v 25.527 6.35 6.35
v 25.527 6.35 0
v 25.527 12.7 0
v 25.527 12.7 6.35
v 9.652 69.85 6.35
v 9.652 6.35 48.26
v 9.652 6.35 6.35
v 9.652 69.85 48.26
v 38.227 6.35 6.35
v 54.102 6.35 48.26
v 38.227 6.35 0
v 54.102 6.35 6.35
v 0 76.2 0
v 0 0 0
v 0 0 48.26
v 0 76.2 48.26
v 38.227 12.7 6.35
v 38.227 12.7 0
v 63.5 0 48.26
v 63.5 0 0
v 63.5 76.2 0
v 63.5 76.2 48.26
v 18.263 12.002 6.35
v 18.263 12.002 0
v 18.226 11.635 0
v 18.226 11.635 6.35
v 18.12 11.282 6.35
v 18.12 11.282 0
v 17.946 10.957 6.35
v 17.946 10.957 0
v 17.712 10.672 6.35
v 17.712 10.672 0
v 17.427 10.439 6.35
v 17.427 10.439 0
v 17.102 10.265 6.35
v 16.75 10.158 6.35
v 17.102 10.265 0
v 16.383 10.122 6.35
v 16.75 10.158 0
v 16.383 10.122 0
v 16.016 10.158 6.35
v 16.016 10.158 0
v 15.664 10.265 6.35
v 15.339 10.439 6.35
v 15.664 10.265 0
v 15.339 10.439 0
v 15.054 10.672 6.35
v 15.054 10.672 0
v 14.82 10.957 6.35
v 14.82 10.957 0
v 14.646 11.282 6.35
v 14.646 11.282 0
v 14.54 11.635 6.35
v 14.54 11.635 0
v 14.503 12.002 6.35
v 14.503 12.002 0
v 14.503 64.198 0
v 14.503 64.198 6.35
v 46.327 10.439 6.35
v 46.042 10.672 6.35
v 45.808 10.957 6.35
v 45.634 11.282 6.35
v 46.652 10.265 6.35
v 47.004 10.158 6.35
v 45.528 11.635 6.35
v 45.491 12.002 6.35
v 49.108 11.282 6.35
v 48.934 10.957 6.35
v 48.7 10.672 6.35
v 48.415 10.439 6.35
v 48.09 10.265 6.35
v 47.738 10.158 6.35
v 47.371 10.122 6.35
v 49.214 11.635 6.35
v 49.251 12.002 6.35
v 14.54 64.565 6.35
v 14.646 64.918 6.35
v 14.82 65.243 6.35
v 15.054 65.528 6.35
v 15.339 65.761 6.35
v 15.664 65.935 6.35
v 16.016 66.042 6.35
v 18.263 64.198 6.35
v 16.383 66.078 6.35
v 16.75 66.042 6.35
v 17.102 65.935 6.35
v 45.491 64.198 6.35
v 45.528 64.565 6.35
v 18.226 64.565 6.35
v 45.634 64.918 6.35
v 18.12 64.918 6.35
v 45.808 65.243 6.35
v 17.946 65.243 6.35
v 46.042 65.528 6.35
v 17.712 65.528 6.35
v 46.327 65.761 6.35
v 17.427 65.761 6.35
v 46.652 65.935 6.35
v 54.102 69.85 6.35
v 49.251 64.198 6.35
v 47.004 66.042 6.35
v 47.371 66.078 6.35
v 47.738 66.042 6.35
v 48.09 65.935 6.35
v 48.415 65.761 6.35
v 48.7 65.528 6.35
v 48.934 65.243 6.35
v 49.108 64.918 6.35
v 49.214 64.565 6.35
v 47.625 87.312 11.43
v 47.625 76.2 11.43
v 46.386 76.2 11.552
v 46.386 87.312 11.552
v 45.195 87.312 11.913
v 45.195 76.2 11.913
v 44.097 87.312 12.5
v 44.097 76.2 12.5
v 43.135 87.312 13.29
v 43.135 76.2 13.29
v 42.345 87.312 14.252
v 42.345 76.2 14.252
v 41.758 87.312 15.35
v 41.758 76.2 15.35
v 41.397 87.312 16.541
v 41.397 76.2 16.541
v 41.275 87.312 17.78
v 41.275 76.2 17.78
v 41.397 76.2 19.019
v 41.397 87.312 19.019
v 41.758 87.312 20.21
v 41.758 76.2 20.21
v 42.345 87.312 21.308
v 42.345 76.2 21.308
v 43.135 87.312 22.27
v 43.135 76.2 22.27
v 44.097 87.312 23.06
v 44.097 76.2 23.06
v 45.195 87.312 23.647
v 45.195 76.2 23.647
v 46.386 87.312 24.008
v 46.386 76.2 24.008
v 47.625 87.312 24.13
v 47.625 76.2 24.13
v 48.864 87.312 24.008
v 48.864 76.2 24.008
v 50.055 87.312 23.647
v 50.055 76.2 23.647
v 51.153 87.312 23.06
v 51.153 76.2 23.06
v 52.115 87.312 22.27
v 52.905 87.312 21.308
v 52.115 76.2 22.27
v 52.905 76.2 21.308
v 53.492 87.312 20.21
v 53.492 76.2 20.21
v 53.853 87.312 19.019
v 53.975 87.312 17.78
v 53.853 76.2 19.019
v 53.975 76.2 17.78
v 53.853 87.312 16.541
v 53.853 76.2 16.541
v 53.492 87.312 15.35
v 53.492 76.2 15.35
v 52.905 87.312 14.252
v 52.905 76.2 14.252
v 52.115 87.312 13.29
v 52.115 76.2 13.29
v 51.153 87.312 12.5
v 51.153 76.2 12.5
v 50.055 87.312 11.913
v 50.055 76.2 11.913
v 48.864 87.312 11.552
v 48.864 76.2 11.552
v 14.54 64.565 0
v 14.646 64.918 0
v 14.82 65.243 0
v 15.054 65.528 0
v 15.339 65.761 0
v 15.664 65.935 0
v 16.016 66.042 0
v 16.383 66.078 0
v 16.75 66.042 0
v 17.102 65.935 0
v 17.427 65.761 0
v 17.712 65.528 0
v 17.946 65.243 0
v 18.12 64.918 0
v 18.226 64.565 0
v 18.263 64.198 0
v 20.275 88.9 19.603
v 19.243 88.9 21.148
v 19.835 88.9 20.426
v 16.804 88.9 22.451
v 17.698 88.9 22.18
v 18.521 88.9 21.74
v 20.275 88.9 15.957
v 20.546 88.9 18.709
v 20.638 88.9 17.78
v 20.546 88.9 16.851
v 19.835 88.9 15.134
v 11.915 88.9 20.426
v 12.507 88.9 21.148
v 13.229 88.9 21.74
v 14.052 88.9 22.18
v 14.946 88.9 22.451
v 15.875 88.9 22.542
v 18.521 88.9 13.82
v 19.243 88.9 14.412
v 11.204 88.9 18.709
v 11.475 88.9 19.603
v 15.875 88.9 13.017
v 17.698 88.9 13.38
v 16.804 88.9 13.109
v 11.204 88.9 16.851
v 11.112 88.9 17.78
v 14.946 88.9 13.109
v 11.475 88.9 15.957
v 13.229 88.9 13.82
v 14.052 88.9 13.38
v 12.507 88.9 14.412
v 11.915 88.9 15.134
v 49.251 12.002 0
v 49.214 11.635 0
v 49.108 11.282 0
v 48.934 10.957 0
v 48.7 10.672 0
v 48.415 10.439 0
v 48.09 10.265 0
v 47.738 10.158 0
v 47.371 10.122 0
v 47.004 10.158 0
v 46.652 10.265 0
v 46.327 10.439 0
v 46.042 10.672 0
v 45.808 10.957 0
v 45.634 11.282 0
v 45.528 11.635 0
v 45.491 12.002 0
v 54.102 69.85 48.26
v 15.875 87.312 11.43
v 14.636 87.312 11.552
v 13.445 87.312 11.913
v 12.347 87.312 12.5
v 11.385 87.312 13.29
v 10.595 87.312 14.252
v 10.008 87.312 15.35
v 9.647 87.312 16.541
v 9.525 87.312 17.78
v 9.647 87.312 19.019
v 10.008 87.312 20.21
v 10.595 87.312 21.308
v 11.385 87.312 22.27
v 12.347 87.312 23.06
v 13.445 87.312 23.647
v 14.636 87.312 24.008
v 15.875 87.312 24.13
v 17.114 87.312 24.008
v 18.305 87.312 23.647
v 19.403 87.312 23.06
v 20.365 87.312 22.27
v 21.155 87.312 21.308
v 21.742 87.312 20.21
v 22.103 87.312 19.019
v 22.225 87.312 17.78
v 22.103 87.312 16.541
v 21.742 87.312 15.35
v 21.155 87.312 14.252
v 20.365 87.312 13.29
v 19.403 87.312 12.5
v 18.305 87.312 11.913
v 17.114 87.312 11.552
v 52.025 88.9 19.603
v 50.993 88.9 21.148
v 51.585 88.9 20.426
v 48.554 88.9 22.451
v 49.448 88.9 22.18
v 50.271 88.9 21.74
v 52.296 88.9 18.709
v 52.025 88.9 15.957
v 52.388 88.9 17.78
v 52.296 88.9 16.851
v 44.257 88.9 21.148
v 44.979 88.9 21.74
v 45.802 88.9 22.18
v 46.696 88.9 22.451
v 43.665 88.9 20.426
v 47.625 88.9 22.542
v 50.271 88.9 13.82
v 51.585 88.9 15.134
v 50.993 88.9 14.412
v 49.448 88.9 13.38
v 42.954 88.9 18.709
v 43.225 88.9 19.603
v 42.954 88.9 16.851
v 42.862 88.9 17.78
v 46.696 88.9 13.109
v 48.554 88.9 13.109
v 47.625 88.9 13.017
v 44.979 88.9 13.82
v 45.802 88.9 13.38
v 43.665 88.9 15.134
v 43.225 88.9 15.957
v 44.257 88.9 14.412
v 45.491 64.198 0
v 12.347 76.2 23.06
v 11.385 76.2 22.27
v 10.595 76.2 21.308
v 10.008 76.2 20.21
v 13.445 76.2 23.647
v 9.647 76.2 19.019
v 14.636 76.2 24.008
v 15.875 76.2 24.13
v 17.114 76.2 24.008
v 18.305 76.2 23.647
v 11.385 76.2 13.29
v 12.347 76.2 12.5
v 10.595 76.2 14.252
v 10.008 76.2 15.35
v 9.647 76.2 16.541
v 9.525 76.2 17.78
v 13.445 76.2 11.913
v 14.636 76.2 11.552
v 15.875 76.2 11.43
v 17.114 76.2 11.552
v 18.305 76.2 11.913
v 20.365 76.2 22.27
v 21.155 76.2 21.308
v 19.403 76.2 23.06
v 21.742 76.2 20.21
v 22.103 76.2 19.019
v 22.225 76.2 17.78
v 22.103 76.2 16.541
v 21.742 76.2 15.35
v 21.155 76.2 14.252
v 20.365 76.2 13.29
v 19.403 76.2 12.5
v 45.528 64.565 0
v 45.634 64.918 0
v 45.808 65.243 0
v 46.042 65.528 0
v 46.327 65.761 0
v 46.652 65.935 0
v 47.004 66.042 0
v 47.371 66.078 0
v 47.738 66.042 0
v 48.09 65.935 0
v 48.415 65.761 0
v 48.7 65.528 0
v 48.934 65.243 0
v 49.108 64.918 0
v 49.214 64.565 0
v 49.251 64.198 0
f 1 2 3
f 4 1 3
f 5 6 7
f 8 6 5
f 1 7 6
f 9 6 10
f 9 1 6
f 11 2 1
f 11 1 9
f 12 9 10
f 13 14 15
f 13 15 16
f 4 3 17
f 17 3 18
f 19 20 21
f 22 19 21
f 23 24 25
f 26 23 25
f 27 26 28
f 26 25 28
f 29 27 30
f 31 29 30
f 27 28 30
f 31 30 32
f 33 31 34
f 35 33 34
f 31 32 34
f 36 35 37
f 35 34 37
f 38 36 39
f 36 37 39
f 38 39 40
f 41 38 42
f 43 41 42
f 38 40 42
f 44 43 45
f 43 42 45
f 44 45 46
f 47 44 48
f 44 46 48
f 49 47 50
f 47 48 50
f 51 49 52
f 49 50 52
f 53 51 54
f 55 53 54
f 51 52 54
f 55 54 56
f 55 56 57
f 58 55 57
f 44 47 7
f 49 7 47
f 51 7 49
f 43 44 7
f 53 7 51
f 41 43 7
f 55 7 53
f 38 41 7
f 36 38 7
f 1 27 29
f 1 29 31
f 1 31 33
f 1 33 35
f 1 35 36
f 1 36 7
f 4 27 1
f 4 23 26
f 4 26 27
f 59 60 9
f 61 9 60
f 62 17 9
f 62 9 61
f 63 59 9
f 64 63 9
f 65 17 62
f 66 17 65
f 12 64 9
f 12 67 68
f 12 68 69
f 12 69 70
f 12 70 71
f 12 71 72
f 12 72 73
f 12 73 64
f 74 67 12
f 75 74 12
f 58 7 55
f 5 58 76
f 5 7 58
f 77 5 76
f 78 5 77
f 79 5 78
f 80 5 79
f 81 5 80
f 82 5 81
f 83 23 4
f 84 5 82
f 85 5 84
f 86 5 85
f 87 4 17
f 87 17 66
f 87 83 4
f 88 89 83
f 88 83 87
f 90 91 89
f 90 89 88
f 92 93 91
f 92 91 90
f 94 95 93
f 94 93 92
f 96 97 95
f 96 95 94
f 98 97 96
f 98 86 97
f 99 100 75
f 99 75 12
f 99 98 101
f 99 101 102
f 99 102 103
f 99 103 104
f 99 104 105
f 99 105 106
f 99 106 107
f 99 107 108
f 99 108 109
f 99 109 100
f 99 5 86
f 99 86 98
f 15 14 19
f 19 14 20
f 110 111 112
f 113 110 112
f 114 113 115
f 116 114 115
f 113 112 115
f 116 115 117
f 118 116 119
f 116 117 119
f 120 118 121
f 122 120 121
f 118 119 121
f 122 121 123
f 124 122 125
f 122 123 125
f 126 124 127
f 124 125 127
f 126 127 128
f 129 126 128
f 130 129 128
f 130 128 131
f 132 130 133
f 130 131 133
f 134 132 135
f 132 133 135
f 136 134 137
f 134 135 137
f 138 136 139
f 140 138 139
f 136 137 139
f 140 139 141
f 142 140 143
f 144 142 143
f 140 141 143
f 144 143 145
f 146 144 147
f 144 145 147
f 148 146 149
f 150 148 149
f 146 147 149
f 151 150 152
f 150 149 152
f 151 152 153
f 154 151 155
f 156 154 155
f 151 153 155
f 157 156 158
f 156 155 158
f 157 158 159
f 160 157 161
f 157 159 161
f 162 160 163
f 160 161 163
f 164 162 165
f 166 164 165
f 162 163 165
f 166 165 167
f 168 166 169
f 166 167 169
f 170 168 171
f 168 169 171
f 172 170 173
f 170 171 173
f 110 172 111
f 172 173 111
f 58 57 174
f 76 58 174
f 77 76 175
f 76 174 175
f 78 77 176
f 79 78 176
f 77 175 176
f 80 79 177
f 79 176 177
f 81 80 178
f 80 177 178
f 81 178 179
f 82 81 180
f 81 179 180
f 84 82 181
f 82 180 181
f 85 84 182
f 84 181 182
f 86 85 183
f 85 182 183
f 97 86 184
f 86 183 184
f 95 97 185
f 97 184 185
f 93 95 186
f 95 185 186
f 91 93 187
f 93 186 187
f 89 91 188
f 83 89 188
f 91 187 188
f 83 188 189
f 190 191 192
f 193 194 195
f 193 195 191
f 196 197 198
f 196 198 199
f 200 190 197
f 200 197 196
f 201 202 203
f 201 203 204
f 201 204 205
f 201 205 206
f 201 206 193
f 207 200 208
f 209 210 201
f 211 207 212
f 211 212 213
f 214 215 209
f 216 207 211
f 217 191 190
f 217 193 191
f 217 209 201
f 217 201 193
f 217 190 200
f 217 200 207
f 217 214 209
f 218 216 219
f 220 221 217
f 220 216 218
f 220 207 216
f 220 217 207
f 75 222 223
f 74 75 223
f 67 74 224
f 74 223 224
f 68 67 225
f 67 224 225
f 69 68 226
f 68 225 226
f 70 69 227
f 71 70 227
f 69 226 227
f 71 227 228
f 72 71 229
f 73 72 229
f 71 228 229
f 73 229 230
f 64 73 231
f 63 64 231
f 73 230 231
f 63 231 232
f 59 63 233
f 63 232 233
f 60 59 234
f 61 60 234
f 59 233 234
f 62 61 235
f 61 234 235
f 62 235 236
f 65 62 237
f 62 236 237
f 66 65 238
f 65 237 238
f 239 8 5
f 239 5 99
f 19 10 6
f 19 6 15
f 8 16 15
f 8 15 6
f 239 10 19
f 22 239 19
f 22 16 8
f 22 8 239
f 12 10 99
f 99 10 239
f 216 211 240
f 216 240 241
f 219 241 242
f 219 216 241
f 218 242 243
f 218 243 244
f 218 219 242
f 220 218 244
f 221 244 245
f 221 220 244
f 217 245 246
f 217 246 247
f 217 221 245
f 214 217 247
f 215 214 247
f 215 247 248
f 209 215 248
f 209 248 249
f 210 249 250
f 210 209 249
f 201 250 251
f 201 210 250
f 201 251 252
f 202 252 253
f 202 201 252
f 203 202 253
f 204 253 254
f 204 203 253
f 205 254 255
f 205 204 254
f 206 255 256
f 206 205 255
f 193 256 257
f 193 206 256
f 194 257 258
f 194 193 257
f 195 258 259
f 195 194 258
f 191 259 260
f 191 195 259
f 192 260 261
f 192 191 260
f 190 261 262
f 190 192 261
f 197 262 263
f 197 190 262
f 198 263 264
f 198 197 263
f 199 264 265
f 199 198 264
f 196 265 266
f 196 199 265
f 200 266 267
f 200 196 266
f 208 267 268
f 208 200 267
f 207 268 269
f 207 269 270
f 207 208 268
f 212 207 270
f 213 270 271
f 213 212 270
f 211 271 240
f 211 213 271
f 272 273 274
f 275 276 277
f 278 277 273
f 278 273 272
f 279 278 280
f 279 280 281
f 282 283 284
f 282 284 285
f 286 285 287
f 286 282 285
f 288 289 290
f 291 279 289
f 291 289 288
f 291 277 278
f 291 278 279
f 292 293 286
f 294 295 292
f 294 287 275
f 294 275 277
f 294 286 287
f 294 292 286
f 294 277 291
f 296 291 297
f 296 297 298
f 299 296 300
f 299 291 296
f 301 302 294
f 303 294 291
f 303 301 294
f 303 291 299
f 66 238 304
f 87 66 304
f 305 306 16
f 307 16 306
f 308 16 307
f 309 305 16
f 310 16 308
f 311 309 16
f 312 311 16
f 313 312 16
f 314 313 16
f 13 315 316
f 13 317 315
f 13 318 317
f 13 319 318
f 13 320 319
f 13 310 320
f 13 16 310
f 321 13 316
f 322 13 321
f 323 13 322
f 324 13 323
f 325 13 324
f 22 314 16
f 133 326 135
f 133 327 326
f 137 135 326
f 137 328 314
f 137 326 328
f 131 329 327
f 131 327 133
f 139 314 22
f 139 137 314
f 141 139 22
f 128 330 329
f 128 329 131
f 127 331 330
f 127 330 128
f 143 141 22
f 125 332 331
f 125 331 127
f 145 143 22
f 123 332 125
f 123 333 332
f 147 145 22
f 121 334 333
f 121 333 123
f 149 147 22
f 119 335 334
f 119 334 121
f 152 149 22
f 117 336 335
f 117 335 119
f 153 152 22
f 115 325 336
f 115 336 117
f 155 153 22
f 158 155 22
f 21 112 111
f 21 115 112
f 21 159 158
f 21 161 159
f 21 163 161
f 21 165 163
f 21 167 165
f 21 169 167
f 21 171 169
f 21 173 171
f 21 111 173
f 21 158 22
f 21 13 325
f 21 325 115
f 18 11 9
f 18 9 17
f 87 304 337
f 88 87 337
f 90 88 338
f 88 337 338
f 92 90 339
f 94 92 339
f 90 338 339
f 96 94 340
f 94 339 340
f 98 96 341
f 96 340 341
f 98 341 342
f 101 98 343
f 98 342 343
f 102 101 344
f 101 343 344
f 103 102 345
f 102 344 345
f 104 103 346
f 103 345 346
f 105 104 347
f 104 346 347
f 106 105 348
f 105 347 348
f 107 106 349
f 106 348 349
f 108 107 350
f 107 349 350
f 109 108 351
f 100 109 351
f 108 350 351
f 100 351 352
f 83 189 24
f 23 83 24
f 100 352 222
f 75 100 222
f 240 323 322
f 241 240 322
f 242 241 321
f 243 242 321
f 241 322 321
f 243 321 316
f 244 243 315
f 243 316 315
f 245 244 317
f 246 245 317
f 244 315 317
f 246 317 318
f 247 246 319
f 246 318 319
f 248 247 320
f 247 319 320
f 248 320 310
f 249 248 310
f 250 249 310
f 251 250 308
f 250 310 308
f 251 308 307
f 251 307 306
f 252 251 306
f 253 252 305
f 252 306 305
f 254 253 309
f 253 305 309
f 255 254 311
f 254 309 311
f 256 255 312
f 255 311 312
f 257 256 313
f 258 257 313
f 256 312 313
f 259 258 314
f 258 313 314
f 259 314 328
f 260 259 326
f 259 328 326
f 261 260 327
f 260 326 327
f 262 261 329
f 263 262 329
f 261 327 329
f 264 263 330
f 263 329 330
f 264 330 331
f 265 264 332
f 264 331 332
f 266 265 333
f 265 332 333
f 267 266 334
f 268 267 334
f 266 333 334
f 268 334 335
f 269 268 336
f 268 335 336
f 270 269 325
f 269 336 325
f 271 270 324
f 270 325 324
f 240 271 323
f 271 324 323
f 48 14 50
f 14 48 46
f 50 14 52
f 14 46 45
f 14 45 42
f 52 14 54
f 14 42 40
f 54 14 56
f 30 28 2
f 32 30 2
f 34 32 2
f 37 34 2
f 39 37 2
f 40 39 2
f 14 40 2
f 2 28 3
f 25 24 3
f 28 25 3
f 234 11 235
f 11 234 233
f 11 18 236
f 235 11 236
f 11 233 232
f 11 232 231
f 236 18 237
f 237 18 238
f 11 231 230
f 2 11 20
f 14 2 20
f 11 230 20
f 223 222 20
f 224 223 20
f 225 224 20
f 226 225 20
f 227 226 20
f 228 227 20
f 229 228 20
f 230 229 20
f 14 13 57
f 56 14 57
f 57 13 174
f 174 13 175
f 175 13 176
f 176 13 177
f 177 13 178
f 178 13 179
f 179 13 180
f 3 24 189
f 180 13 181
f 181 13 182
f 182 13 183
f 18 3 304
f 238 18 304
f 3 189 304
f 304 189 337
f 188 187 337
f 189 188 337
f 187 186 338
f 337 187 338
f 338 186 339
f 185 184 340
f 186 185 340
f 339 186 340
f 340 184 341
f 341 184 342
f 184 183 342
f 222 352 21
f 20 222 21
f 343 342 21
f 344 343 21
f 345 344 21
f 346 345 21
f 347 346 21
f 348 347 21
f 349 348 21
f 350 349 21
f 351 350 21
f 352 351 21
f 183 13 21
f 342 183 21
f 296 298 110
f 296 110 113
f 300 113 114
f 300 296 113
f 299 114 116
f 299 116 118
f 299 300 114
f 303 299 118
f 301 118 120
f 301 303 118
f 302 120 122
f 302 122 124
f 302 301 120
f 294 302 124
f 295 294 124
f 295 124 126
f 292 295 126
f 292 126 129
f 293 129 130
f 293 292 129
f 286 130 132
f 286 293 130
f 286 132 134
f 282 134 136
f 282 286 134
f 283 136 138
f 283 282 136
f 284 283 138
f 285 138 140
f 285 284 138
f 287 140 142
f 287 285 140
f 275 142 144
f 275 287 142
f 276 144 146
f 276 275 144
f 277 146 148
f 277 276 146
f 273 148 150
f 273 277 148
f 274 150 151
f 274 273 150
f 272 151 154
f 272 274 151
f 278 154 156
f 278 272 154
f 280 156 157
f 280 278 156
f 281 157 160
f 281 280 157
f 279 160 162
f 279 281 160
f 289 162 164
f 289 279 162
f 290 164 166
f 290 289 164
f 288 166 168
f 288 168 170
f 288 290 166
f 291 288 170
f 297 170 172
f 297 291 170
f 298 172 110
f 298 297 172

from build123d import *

# Parameters (mm, degrees)
SKETCH2_W               = 63.5
SKETCH2_H               = 76.2
BOSS_EXTRUDE1_DEPTH     = 48.26
SKETCH3_W               = 44.45
SKETCH3_H               = 63.5
CUT_EXTRUDE1_DEPTH      = 41.91
CUT_EXTRUDE2_DEPTH      = 108.680722973
CUT_EXTRUDE2_DEPTH_BACK = 108.680722973
SKETCH4_W               = 12.7
SKETCH4_H               = 6.35
SKETCH5_R               = 6.35
BOSS_EXTRUDE2_DEPTH     = 12.7
CHAMFER1_SIZE           = 1.5875


with BuildPart() as part:
    # Sketch2 → Boss-Extrude1 (new body)
    with BuildSketch(Plane.XY):
        with Locations((31.75, 38.1)):
            Rectangle(SKETCH2_W, SKETCH2_H)
    extrude(amount=BOSS_EXTRUDE1_DEPTH)

    # Sketch3 → Cut-Extrude1 (cut)
    with BuildSketch(Plane.XY.offset(48.26)):
        with Locations((31.877, 38.1)):
            Rectangle(SKETCH3_W, SKETCH3_H)
    extrude(amount=-CUT_EXTRUDE1_DEPTH, mode=Mode.SUBTRACT)

    # Sketch4 → Cut-Extrude2 (cut, two sides: drawn at the far end of the back side and taken through both)
    with BuildSketch(Plane.XY.offset(6.35).offset(-CUT_EXTRUDE2_DEPTH_BACK)):
        with Locations((31.877, 9.525)):
            Rectangle(SKETCH4_W, SKETCH4_H)
        with BuildLine():
            Line((18.2626, 64.1985), (18.2626, 12.0015))
            ThreePointArc((18.2626, 12.0015), (16.383, 10.1219), (14.5034, 12.0015))
            Line((14.5034, 12.0015), (14.5034, 64.1985))
            ThreePointArc((14.5034, 64.1985), (16.383, 66.0781), (18.2626, 64.1985))
        make_face()
        with BuildLine():
            Line((49.2506, 64.1985), (49.2506, 12.0015))
            ThreePointArc((49.2506, 12.0015), (47.371, 10.1219), (45.4914, 12.0015))
            Line((45.4914, 12.0015), (45.4914, 64.1985))
            ThreePointArc((45.4914, 64.1985), (47.371, 66.0781), (49.2506, 64.1985))
        make_face()
    extrude(amount=CUT_EXTRUDE2_DEPTH + CUT_EXTRUDE2_DEPTH_BACK, mode=Mode.SUBTRACT)

    # Sketch5 → Boss-Extrude2 (add)
    with BuildSketch(Plane(origin=(0, 76.2, 0), x_dir=(1, 0, 0), z_dir=(0, 1, 0))):
        with Locations(Location((15.875, -17.78, 0), (0, 0, 90))):
            Circle(SKETCH5_R)
        with Locations(Location((47.625, -17.78, 0), (0, 0, 90))):
            Circle(SKETCH5_R)
    extrude(amount=BOSS_EXTRUDE2_DEPTH)

    # Chamfer1
    chamfer1_edges = [part.edges().sort_by_distance(p)[0] for p in [
        (15.875, 88.9, 24.13),
        (47.625, 88.9, 24.13),
    ]]
    chamfer(chamfer1_edges, length=CHAMFER1_SIZE)


solid = part.part
